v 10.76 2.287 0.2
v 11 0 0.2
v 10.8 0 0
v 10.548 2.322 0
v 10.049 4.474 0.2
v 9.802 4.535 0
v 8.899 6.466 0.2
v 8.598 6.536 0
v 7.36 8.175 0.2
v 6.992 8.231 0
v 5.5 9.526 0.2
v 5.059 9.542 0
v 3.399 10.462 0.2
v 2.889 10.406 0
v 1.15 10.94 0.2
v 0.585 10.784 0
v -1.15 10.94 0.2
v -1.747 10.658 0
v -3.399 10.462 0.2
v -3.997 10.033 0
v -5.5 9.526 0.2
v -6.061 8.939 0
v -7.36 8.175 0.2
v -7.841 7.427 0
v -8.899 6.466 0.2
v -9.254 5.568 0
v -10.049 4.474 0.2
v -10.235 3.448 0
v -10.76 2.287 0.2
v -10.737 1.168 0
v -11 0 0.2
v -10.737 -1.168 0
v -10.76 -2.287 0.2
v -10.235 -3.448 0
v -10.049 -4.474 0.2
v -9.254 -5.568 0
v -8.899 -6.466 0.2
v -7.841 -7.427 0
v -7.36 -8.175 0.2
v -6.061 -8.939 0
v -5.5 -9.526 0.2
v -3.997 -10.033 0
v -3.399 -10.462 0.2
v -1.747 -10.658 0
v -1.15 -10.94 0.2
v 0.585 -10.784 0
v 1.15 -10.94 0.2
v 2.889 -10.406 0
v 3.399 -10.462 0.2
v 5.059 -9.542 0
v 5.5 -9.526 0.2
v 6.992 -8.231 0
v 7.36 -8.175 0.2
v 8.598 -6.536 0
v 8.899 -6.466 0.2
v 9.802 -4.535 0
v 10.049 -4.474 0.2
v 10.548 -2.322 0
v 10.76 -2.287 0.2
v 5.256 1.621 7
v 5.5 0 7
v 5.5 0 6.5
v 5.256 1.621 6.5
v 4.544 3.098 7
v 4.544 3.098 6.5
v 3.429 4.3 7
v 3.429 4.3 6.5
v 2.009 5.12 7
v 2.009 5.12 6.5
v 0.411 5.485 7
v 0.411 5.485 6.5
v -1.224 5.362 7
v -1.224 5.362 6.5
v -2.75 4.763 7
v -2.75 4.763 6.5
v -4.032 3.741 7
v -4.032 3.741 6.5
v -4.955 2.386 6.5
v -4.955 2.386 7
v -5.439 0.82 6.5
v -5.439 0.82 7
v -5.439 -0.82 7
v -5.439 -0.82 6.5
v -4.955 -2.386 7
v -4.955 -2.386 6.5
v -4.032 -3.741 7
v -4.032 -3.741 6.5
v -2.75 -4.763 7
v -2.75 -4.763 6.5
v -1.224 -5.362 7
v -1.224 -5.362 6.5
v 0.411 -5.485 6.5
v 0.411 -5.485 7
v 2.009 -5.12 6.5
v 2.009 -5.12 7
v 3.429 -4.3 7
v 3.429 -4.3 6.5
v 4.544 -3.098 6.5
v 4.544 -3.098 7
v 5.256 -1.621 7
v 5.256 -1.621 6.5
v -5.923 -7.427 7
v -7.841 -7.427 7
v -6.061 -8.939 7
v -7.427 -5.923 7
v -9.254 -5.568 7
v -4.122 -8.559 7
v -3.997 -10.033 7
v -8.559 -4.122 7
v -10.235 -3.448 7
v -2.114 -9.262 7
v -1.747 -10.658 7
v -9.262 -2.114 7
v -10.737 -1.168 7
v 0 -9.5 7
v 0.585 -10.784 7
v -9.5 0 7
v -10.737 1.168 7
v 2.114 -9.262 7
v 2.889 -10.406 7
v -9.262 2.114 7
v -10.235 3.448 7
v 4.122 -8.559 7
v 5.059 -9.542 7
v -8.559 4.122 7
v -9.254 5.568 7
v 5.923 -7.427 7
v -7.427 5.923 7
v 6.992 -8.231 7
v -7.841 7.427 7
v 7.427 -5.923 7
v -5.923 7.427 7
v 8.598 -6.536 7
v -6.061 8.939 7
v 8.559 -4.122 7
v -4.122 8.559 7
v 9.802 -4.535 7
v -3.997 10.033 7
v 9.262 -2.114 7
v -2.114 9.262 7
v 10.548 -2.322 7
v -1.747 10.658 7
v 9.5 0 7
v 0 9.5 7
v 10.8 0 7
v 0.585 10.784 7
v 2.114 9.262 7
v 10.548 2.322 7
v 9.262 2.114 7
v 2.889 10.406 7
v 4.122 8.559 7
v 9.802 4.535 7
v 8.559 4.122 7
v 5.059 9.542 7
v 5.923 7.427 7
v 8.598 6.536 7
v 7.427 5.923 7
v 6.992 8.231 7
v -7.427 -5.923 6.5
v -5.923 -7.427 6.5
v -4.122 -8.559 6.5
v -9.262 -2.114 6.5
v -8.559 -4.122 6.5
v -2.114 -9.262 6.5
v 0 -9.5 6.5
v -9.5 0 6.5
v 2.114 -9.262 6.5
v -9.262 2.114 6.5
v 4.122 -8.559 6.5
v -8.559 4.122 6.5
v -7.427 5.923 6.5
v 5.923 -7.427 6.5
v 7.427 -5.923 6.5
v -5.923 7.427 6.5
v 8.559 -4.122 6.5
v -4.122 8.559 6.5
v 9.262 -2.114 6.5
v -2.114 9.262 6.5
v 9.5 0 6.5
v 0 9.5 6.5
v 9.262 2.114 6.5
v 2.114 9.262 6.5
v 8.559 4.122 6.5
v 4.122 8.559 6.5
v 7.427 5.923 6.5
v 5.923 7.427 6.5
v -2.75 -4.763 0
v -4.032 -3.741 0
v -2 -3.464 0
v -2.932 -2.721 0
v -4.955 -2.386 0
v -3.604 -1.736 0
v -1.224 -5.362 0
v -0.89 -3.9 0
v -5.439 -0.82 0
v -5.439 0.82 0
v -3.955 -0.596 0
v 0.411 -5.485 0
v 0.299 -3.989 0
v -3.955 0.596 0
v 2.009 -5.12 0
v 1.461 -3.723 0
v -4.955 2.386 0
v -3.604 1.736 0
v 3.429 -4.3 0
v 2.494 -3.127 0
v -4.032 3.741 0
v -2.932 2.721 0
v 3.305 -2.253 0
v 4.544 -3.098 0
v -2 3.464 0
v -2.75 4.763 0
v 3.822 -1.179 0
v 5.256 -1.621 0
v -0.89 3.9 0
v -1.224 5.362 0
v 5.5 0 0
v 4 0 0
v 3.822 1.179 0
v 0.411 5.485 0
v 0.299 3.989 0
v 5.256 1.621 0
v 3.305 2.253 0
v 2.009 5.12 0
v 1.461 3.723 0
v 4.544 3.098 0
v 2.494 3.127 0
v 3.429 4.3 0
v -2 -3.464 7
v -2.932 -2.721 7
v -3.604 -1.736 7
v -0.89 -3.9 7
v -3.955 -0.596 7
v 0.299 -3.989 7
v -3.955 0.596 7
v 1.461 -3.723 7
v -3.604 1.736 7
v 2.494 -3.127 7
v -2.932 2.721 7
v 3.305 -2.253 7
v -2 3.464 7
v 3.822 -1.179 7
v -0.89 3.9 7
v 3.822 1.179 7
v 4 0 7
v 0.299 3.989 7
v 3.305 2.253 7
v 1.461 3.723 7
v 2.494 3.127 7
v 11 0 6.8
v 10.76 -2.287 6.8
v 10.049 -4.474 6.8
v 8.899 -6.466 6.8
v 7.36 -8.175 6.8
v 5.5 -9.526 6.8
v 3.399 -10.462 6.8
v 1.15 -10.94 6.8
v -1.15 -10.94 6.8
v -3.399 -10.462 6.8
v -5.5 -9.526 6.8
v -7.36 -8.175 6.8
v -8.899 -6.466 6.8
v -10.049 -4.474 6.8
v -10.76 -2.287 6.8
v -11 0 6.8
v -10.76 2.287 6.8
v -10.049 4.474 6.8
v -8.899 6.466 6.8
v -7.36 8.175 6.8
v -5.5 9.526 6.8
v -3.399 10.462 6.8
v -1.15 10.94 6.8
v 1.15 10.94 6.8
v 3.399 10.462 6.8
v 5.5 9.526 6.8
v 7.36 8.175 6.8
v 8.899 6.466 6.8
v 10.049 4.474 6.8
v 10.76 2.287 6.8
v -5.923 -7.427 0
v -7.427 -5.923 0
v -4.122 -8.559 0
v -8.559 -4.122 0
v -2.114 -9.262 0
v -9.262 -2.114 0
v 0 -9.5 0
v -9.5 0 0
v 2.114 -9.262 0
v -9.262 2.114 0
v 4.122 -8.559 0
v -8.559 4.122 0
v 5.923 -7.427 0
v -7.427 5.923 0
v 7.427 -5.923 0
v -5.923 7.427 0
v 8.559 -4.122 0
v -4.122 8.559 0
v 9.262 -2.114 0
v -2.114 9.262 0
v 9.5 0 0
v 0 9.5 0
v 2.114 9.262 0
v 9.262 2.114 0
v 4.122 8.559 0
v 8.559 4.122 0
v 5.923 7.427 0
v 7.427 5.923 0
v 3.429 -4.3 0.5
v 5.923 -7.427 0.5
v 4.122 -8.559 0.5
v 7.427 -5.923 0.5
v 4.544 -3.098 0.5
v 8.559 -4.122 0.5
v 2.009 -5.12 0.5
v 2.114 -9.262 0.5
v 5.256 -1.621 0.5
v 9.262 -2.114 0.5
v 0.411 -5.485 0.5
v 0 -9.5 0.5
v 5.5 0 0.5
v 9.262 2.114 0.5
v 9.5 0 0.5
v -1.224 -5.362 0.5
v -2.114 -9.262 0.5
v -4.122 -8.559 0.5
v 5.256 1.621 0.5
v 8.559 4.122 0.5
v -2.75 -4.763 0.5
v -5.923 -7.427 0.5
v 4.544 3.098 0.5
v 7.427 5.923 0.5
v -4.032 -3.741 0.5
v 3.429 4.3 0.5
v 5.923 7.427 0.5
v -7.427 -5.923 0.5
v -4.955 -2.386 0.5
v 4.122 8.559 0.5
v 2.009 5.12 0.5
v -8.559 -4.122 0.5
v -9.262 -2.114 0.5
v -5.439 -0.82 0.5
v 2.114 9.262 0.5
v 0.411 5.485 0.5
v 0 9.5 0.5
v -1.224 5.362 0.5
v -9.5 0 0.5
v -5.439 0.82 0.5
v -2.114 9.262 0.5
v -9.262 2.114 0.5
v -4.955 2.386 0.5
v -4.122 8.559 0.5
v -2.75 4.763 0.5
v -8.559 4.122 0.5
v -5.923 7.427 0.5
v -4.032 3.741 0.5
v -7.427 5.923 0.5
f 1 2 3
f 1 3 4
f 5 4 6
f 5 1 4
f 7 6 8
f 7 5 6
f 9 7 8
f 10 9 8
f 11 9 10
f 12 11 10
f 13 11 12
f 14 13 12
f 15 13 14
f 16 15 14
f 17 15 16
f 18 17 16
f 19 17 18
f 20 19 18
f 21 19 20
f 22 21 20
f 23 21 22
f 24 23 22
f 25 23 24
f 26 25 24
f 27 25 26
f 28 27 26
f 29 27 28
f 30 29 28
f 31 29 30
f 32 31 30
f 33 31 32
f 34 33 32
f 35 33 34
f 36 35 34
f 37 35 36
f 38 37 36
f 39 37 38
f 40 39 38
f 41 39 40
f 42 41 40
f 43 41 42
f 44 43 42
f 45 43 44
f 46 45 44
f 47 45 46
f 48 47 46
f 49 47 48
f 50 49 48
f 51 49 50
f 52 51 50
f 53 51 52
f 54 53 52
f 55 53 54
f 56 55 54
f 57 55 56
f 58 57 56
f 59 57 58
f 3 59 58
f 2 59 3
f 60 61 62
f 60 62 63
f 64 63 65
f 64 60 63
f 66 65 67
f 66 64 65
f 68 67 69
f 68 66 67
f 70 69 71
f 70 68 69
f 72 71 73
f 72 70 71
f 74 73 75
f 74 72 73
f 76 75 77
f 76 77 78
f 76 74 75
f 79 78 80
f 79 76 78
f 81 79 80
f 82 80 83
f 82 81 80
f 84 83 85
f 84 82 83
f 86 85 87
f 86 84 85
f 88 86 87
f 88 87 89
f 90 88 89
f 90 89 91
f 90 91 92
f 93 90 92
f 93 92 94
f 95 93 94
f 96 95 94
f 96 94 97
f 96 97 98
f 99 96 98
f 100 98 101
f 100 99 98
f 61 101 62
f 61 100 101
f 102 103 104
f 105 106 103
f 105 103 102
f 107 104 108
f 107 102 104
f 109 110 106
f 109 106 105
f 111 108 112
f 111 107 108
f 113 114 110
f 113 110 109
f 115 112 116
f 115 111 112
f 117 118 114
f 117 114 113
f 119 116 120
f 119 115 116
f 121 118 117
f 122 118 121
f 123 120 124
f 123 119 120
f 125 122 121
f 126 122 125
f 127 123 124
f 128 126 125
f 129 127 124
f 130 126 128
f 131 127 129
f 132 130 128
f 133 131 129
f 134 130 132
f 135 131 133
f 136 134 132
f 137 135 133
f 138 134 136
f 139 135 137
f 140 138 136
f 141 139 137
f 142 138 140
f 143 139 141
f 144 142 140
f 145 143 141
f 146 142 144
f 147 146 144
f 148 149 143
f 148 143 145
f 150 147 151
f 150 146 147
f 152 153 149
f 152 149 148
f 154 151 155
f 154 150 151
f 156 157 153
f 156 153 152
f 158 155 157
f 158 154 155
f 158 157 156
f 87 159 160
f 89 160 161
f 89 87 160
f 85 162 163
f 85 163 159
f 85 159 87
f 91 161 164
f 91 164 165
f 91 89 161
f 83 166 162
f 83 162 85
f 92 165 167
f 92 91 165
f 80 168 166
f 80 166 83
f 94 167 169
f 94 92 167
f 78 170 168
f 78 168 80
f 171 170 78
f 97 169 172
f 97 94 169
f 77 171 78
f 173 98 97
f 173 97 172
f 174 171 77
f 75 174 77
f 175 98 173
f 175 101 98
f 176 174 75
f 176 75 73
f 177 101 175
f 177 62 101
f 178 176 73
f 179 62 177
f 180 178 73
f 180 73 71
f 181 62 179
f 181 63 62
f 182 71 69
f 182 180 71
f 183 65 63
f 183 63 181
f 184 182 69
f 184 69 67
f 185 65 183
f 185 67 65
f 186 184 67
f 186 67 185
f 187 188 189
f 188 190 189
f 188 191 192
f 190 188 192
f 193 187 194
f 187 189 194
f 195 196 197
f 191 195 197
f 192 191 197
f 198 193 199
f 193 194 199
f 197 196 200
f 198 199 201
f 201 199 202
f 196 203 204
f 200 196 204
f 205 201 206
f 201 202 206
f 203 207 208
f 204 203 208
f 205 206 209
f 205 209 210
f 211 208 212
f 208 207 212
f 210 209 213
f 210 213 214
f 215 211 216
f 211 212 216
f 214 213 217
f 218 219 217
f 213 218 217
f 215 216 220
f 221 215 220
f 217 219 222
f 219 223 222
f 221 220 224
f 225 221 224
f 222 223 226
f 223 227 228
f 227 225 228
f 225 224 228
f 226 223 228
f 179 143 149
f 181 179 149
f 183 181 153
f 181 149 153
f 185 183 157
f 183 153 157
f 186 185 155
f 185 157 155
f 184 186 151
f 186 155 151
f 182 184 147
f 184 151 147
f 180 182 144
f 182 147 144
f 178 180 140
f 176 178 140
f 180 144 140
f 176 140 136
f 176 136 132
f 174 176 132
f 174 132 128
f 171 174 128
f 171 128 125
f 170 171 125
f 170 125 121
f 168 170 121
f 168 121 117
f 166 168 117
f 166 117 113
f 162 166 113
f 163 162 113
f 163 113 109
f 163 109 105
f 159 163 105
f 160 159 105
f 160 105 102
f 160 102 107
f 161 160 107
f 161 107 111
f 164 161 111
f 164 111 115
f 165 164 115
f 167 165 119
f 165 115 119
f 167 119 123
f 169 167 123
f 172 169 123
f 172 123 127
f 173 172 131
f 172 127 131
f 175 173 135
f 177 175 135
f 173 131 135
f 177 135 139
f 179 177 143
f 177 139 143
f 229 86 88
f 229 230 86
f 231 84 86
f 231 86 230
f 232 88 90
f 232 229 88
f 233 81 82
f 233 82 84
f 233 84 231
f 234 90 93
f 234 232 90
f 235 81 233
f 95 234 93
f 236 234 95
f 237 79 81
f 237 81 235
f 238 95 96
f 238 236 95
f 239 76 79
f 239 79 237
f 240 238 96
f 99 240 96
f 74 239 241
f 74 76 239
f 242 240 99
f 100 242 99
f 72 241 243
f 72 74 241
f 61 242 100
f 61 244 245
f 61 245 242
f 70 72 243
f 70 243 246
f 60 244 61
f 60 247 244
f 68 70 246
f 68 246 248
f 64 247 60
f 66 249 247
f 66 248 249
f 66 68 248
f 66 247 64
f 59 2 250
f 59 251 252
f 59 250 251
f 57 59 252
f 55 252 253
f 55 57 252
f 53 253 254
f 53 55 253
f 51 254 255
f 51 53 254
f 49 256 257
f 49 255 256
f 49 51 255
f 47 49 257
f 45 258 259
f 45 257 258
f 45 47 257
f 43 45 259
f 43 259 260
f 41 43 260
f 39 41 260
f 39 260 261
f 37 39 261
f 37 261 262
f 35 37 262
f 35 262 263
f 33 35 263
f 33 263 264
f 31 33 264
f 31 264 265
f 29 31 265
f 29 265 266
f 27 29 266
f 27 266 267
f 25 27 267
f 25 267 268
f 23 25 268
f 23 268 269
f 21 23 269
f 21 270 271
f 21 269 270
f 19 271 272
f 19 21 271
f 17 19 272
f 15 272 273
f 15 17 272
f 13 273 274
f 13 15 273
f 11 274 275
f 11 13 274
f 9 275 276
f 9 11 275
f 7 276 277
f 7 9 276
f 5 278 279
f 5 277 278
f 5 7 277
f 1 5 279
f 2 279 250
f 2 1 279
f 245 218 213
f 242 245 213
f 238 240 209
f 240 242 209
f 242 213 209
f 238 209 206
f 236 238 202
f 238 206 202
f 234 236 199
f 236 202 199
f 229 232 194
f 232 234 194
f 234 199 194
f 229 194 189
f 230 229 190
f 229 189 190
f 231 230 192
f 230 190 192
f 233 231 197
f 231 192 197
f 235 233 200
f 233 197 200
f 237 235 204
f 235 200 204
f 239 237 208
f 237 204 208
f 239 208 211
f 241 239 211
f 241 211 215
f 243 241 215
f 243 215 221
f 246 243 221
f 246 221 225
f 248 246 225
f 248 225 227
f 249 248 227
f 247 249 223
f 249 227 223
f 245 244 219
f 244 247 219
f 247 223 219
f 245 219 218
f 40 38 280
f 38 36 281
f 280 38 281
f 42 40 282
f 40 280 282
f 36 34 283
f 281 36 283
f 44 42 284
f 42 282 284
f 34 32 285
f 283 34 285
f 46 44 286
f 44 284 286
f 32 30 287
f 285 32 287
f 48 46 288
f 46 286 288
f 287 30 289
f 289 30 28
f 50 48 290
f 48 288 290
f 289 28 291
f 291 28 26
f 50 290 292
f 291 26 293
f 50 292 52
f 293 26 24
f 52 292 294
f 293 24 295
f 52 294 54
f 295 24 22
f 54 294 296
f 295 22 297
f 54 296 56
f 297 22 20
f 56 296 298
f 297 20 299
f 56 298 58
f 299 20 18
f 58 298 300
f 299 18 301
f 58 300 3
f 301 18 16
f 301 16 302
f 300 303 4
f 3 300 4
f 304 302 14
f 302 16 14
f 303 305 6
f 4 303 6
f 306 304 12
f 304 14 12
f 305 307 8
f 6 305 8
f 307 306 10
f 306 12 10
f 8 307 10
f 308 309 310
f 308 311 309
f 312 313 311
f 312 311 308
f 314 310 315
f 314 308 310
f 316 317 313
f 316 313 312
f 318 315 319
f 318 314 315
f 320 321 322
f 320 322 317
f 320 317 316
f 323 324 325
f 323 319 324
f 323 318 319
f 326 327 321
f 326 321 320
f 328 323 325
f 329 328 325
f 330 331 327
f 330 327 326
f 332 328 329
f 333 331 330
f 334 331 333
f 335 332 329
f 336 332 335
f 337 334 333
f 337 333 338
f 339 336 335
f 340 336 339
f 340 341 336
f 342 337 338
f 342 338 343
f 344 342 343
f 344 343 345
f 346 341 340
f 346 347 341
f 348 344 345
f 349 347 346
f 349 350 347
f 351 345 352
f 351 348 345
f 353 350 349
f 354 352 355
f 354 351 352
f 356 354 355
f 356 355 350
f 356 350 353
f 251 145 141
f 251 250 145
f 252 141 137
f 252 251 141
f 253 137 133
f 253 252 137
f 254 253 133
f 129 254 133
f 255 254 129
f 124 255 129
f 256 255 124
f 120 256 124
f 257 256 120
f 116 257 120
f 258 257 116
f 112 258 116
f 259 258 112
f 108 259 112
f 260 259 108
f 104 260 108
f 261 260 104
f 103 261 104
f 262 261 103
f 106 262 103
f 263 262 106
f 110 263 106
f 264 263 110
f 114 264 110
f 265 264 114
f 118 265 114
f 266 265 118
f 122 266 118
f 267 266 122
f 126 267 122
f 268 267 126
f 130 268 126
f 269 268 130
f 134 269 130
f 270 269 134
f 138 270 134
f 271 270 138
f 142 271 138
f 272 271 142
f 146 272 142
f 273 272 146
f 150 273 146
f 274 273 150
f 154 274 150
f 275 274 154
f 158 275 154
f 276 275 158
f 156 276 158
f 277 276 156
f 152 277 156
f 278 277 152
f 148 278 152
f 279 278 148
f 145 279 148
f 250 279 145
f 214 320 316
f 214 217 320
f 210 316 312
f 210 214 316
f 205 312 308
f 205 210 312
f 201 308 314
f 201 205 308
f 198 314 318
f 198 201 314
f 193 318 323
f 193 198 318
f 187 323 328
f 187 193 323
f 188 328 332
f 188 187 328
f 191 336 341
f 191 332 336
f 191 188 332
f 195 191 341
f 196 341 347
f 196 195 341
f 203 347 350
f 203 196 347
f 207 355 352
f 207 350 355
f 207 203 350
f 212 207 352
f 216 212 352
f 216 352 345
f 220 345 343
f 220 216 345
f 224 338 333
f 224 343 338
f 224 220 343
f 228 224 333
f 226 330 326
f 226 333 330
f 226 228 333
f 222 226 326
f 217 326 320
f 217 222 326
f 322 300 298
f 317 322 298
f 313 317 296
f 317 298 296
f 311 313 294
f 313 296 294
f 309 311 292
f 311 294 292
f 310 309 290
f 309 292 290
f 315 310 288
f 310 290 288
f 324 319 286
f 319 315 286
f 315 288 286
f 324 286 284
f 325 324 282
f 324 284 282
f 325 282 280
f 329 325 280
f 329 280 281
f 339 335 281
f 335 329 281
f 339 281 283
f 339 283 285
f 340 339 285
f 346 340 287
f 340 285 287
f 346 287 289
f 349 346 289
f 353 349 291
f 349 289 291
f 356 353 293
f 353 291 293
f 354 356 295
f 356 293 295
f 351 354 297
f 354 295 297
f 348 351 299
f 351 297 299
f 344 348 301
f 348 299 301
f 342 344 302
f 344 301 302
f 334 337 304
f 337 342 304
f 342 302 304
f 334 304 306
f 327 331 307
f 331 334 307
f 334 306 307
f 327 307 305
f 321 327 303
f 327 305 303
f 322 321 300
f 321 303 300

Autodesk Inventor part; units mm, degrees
ref_plane "YZ Plane" through (0, 0, 0) normal (1, 0, 0) x (0, 1, 0)
ref_plane "XZ Plane" through (0, 0, 0) normal (0, 1, 0) x (-1, 0, 0)
sketch "Sketch1" plane through (0, 0, 0) normal (0, 0, 1) x (1, 0, 0)
  circle A0 centre (0, 0) radius 4
  circle A1 centre (0, 0) radius 11
  dimension "d0" = 8
  dimension "d1" = 22
extrude "Extrusion1" add sketch "Sketch1" along normal blind 7
sketch "Sketch2" plane through (0, 0, 7) normal (0, 0, 1) x (1, 0, 0)
  circle A0 centre (0, 0) radius 11 projected
  circle A1 centre (0, 0) radius 4 projected
  circle A2 centre (0, 0) radius 9.5
  circle A3 centre (0, 0) radius 5.5
  dimension "d4" = 1.5
  dimension "d5" = 1.5
extrude "Extrusion2" cut sketch "Sketch2" against normal blind 0.5 contours A2
ref_plane "Work Plane1" through (0, 0, 3.5) normal (0, 0, 1) x (1, 0, 0)
mirror "Mirror1" about plane through (0, 0, 3.5) normal (0, 0, 1) of "Extrusion2"
chamfer "Chamfer1" distance 0.2 angle 45 2 edges at (-11, 0, 7) (-11, 0, 0)
properties part number "608 Bearing"
